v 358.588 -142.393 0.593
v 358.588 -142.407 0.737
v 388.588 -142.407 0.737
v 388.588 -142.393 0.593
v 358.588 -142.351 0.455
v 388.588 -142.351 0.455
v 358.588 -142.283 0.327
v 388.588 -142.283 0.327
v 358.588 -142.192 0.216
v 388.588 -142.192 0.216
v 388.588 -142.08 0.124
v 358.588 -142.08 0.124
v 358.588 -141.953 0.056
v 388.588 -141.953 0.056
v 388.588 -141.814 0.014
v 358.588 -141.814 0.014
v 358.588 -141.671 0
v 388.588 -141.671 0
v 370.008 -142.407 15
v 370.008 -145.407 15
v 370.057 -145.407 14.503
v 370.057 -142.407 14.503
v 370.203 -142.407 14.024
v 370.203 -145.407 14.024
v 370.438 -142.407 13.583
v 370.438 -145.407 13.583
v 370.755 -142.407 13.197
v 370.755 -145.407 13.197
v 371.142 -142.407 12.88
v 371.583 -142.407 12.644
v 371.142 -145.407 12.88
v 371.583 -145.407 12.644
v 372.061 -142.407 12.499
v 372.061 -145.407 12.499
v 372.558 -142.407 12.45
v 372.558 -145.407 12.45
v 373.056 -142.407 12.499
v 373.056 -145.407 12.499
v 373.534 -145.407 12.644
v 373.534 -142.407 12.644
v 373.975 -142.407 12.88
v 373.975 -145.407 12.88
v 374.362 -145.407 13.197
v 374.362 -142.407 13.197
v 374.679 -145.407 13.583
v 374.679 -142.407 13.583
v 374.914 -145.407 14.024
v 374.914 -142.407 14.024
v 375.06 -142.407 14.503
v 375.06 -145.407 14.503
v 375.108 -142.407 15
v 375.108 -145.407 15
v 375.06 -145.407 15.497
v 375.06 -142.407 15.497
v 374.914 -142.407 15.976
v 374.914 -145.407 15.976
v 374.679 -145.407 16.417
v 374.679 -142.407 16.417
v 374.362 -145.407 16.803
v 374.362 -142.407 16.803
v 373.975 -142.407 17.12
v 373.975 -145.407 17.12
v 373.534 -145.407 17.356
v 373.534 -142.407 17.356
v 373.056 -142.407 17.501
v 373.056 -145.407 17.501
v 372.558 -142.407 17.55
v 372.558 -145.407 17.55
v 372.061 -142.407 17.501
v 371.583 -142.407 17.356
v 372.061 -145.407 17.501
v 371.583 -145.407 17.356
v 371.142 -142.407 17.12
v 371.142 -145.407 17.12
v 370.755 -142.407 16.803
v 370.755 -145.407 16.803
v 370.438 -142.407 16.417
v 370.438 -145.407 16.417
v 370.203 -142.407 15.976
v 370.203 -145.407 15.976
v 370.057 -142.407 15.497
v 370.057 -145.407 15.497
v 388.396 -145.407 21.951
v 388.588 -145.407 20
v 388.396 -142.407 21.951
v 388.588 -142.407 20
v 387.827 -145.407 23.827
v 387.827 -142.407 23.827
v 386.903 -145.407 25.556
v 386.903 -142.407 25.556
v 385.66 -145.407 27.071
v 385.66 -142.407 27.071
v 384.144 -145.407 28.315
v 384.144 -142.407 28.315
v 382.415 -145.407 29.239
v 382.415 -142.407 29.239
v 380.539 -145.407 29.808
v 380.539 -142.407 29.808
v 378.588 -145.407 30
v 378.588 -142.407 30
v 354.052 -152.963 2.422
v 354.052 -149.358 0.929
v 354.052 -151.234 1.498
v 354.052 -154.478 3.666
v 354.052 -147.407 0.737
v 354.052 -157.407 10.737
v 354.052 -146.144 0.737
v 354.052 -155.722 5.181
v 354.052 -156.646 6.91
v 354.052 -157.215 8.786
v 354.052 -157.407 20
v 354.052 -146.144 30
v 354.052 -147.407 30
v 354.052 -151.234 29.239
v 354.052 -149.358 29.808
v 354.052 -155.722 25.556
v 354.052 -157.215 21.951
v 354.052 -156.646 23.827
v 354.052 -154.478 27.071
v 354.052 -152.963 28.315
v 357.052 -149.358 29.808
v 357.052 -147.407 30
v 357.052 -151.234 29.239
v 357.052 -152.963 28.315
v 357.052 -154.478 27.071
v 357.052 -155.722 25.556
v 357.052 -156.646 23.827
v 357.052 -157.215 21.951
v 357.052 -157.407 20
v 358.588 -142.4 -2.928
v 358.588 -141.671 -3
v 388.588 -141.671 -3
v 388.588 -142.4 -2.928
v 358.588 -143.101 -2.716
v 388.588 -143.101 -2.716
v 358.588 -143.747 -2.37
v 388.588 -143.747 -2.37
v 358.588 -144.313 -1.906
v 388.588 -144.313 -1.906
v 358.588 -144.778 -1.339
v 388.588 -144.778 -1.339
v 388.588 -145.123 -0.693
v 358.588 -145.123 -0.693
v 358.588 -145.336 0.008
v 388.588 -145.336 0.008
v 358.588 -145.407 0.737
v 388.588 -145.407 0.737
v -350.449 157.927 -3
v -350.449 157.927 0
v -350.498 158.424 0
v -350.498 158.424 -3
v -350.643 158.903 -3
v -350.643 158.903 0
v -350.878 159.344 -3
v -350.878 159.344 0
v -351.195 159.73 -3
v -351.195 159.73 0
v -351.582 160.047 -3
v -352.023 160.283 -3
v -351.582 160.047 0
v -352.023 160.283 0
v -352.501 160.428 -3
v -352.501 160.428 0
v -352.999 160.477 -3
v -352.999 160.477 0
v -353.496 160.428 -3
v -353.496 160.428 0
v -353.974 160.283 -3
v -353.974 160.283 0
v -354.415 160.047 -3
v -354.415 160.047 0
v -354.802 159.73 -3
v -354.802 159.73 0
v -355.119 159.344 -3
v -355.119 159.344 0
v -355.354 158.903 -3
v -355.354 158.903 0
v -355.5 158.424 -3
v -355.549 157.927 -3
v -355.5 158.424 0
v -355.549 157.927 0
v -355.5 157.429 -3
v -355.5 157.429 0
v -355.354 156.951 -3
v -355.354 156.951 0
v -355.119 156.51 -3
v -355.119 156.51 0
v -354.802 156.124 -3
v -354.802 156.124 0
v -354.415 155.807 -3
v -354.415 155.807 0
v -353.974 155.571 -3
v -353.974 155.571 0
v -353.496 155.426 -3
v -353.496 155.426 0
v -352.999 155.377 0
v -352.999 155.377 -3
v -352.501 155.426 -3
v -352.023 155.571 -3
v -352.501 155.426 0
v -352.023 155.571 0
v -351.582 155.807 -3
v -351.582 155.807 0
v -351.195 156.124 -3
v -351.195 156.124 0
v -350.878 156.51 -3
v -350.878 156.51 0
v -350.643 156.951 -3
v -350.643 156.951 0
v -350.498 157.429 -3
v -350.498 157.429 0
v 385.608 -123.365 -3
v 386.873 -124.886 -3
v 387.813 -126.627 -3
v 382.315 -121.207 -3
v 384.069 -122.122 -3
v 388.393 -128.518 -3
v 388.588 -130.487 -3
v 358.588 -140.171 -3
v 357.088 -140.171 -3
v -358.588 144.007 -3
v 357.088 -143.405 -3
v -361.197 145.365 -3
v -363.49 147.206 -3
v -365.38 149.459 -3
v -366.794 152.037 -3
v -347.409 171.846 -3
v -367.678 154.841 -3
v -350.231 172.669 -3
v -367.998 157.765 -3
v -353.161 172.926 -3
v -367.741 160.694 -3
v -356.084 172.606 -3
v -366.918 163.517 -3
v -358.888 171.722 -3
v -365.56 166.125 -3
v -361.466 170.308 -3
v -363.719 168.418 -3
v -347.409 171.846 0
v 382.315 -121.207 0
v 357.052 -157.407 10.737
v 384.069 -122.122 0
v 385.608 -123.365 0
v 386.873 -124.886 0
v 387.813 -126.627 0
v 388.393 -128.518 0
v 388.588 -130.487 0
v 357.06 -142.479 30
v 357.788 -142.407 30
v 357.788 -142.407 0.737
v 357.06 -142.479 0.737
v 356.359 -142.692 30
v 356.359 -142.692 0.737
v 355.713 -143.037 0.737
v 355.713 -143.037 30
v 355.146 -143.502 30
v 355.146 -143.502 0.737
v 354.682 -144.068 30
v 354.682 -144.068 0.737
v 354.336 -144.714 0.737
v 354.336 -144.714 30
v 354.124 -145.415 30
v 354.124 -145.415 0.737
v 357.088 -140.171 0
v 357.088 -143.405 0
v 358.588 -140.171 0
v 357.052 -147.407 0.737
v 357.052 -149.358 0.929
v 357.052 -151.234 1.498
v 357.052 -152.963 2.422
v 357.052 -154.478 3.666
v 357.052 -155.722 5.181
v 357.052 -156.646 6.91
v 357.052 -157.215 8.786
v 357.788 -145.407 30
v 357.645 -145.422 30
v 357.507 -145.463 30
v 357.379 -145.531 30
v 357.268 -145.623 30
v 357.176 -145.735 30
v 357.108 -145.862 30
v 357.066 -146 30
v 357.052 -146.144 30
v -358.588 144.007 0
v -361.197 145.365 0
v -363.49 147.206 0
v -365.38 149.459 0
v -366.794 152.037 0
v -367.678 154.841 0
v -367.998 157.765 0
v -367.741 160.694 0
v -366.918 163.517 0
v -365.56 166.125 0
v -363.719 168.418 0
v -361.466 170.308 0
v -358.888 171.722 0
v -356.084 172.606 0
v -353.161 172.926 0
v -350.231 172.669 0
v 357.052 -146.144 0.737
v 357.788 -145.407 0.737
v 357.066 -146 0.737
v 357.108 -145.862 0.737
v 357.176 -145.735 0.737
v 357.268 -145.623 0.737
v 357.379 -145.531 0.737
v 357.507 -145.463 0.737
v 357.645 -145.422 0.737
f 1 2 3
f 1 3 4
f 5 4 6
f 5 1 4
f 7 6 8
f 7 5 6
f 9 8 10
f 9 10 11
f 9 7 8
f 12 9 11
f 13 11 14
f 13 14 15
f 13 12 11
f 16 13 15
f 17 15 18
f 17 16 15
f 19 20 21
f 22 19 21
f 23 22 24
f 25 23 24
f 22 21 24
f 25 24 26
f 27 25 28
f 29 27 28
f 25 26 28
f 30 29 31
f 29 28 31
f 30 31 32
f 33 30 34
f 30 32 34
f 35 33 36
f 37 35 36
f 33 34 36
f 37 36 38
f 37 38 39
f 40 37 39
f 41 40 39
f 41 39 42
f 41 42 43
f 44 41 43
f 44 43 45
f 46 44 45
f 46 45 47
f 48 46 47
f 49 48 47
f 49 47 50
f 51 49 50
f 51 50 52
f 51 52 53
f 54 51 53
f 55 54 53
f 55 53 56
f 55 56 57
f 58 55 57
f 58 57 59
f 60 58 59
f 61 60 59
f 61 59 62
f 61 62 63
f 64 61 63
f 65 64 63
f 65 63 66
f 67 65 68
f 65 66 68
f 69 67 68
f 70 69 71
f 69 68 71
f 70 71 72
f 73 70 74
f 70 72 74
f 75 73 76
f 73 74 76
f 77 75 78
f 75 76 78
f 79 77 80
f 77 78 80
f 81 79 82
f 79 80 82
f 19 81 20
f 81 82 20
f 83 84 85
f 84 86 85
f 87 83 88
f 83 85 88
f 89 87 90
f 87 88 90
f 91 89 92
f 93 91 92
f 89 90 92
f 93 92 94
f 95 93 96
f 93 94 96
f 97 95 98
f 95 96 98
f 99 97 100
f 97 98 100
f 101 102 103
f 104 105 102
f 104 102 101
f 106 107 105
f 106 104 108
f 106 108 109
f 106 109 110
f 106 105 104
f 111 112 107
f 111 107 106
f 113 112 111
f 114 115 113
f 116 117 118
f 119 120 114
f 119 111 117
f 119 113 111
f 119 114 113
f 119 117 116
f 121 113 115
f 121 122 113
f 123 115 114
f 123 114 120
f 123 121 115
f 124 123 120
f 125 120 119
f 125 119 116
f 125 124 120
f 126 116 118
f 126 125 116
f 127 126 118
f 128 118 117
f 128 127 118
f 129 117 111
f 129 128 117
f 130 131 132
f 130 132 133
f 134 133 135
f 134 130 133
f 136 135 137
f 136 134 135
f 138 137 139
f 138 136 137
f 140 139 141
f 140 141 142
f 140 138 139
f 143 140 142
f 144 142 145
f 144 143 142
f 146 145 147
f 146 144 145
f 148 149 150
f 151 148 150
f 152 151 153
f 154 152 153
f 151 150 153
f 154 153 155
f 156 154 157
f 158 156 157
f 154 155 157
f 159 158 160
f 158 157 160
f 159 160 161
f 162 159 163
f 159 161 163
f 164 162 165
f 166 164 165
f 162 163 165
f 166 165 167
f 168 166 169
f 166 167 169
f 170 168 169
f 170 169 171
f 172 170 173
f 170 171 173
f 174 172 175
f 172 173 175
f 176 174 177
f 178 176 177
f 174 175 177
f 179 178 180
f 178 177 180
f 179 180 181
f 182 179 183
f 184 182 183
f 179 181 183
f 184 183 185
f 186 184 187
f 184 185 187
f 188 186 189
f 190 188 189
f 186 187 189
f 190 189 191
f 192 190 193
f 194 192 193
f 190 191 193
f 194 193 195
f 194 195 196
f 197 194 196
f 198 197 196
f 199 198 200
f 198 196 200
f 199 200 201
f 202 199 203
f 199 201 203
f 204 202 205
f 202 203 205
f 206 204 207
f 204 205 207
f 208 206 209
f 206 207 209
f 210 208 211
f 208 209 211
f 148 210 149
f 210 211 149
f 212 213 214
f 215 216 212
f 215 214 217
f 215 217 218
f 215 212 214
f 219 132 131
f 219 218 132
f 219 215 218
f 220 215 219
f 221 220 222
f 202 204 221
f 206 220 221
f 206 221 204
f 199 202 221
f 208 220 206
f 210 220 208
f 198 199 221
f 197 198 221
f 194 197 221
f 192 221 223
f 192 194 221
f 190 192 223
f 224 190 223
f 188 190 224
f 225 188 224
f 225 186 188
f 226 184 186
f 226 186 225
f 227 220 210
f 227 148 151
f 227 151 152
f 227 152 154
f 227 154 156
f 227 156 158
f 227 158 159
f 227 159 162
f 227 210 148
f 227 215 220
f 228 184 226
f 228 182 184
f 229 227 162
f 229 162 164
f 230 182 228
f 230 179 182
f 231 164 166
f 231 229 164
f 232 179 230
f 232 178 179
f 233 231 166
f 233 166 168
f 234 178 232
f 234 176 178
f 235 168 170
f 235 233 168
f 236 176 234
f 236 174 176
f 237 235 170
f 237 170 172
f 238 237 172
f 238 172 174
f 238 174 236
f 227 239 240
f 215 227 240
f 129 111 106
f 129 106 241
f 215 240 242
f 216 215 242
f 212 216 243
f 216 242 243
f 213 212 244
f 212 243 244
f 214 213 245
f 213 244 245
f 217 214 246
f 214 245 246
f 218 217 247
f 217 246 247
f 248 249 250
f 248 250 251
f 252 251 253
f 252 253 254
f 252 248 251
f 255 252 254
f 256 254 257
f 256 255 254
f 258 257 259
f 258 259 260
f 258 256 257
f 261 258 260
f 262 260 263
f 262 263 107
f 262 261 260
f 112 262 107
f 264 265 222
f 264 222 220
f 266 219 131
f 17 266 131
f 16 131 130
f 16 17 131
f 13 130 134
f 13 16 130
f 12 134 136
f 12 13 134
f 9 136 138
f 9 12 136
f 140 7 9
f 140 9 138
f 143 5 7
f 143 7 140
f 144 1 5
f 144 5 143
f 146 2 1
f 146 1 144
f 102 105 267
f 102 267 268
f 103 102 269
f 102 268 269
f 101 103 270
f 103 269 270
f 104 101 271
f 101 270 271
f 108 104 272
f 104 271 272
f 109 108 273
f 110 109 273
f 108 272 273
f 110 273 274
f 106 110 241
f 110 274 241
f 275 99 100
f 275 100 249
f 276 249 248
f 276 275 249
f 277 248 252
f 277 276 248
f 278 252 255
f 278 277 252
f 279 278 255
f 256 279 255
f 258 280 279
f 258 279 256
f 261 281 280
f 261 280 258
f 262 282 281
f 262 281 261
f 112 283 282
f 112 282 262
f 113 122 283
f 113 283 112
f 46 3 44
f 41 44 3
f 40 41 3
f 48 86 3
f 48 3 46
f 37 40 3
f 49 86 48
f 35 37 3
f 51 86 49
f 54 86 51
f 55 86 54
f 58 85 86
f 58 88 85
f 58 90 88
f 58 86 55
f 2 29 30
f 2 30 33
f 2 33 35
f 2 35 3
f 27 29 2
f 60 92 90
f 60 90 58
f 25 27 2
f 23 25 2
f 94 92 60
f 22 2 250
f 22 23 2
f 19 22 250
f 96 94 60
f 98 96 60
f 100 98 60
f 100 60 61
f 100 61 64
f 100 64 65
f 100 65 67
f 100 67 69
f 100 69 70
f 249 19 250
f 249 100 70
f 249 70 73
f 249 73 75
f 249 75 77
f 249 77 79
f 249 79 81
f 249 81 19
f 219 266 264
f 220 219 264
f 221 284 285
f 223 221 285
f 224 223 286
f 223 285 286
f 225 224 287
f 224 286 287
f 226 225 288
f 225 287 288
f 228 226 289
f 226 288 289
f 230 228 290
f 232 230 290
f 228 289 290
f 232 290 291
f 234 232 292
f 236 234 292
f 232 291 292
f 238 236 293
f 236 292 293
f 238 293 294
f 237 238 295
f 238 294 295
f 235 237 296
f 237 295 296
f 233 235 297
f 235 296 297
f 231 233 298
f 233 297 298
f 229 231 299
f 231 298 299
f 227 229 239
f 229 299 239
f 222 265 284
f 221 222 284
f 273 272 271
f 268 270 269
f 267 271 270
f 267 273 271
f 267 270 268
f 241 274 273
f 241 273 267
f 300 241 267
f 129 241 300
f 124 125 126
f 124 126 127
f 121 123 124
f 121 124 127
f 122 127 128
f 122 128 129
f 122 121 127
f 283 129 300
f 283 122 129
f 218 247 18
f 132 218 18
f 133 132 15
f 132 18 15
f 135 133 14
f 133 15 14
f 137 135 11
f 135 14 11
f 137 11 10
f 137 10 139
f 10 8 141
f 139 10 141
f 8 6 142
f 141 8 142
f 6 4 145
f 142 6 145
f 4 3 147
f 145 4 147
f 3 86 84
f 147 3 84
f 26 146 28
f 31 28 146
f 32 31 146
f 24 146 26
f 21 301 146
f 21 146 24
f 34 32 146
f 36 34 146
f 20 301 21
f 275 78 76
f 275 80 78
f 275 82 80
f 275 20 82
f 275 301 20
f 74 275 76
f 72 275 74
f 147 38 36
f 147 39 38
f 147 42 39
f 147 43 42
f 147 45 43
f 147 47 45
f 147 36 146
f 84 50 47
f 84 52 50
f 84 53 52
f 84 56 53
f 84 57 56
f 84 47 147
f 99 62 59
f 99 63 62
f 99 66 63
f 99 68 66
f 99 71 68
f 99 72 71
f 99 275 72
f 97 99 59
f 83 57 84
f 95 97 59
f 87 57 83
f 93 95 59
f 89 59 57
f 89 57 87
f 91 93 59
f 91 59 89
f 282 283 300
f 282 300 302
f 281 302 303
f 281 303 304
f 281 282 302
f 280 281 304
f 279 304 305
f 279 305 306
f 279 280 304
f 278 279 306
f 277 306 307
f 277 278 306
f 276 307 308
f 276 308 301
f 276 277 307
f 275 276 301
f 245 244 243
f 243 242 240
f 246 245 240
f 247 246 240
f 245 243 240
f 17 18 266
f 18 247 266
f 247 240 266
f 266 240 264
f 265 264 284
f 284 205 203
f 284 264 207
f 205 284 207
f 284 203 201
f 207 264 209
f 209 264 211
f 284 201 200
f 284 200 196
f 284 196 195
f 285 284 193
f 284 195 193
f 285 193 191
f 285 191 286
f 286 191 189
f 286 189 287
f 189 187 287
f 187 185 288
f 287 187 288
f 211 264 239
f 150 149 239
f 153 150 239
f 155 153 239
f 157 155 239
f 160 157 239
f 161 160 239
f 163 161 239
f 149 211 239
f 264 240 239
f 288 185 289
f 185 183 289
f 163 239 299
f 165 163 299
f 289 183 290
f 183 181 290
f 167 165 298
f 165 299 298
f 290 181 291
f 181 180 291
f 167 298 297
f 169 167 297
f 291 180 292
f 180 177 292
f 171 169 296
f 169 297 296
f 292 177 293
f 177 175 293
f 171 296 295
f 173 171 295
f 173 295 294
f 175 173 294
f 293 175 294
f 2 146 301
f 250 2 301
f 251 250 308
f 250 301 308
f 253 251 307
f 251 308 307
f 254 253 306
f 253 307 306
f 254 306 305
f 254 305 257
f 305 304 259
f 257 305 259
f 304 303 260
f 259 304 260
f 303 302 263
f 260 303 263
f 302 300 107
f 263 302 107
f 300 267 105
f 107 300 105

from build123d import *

# Parameters (mm, degrees)
SKETCH1_R                      = 2.55
BASE_FLANGE1_DEPTH             = 3
EDGE_FLANGE1_STRIP_W           = 14.8732
EDGE_FLANGE1_STRIP_H           = 3
EDGE_FLANGE1_STRIP_CUT_DEPTH   = 30
EDGE_FLANGE1_RELIEF_W          = 16.3732
EDGE_FLANGE1_RELIEF_H          = 1.5
EDGE_FLANGE1_RELIEF_CUT_DEPTH  = 3
EDGE_FLANGE1_DEPTH             = 30
EDGE_FLANGE2_DEPTH             = 29.2634
FILLET1_R                      = 10
F_5_1_5_1_DIAMETER_HOLE1_D     = 5.1
F_5_1_5_1_DIAMETER_HOLE1_DEPTH = 10
F_5_1_5_1_DIAMETER_HOLE1_TIP   = 1.532194579


# Sheet-metal steps are written as plain solids
with BuildPart() as part:
    # Sketch1 → Base-Flange1 (new body)
    with BuildSketch(Plane.XY):
        with BuildLine():
            Line((358.5885, -144.00735), (-358.5885, 144.00735))
            ThreePointArc((-358.5885, 144.00735), (-366.917987263, 163.516825696), (-347.408511566, 171.846312959))
            Line((-347.408511566, 171.846312959), (382.315162811, -121.207068785))
            ThreePointArc((382.315162811, -121.207068785), (386.873022561, -124.886126177), (388.5885, -130.486723104))
            Line((388.5885, -130.486723104), (388.5885, -144.00735))
            Line((388.5885, -144.00735), (358.5885, -144.00735))
        make_face()
        with Locations((-352.998505783, 157.926831479)):
            Circle(SKETCH1_R, mode=Mode.SUBTRACT)
    extrude(amount=-BASE_FLANGE1_DEPTH)

    # Edge-Flange1 strip (across the edge) → Edge-Flange1 strip cut (cut)
    with BuildSketch(Plane(origin=(358.5885, -145.40735, 0), x_dir=(0, 1, 0), z_dir=(1, 0, 0))):
        with Locations((-3.7, -1.5)):
            Rectangle(EDGE_FLANGE1_STRIP_W, EDGE_FLANGE1_STRIP_H)
    extrude(amount=EDGE_FLANGE1_STRIP_CUT_DEPTH, mode=Mode.SUBTRACT)

    # Edge-Flange1 relief (on the sheet) → Edge-Flange1 relief cut (cut)
    with BuildSketch(Plane(origin=(358.5885, -141.67075, 0), x_dir=(0, 1, 0), z_dir=(0, 0, 1))):
        with Locations((-6.6866, 0.75)):
            Rectangle(EDGE_FLANGE1_RELIEF_W, EDGE_FLANGE1_RELIEF_H)
    extrude(amount=-EDGE_FLANGE1_RELIEF_CUT_DEPTH, mode=Mode.SUBTRACT)

    # Edge-Flange1 section (across the edge) → Edge-Flange1 (add)
    with BuildSketch(Plane(origin=(358.5885, -145.40735, 0), x_dir=(0, 1, 0), z_dir=(1, 0, 0))):
        with BuildLine():
            Line((0, 0.7366), (0, 30))
            Line((0, 30), (3, 30))
            Line((3, 30), (3, 0.7366))
            ThreePointArc((3, 0.7366), (3.215745145, 0.215745145), (3.7366, 0))
            Line((3.7366, 0), (3.7366, -3))
            ThreePointArc((3.7366, -3), (1.094424801, -1.905575199), (0, 0.7366))
        make_face()
    extrude(amount=EDGE_FLANGE1_DEPTH)

    # Edge-Flange2 section (across the edge) → Edge-Flange2 (add)
    with BuildSketch(Plane(origin=(357.0519, -145.40735, 30), x_dir=(1, 0, 0), z_dir=(0, 0, -1))):
        with BuildLine():
            Line((-3, 0.7366), (-3, 12))
            Line((-3, 12), (0, 12))
            Line((0, 12), (0, 0.7366))
            ThreePointArc((0, 0.7366), (0.215745145, 0.215745145), (0.7366, 0))
            Line((0.7366, 0), (1.5366, 0))
            Line((1.5366, 0), (1.5366, -3))
            Line((1.5366, -3), (0.7366, -3))
            ThreePointArc((0.7366, -3), (-1.905575199, -1.905575199), (-3, 0.7366))
        make_face()
    extrude(amount=EDGE_FLANGE2_DEPTH)

    # Fillet1
    fillet1_edges = [part.edges().sort_by_distance(p)[0] for p in [
        (388.5885, -143.90735, 30),
        (355.5519, -157.40735, 30),
        (355.5519, -157.40735, 0.7366),
    ]]
    fillet(fillet1_edges, radius=FILLET1_R)

    # Ø5.1 (5.1) Diameter Hole1
    with Locations(Plane(origin=(0, -142.40735, 0), x_dir=(1, 0, 0), z_dir=(0, 1, 0))):
        with Locations((372.5585, -15)):
            Hole(F_5_1_5_1_DIAMETER_HOLE1_D / 2, depth=F_5_1_5_1_DIAMETER_HOLE1_DEPTH)
            with Locations((0, 0, -(F_5_1_5_1_DIAMETER_HOLE1_DEPTH + F_5_1_5_1_DIAMETER_HOLE1_TIP / 2))):  # 118° drill point
                Cone(0, F_5_1_5_1_DIAMETER_HOLE1_D / 2, F_5_1_5_1_DIAMETER_HOLE1_TIP, mode=Mode.SUBTRACT)


solid = part.part
